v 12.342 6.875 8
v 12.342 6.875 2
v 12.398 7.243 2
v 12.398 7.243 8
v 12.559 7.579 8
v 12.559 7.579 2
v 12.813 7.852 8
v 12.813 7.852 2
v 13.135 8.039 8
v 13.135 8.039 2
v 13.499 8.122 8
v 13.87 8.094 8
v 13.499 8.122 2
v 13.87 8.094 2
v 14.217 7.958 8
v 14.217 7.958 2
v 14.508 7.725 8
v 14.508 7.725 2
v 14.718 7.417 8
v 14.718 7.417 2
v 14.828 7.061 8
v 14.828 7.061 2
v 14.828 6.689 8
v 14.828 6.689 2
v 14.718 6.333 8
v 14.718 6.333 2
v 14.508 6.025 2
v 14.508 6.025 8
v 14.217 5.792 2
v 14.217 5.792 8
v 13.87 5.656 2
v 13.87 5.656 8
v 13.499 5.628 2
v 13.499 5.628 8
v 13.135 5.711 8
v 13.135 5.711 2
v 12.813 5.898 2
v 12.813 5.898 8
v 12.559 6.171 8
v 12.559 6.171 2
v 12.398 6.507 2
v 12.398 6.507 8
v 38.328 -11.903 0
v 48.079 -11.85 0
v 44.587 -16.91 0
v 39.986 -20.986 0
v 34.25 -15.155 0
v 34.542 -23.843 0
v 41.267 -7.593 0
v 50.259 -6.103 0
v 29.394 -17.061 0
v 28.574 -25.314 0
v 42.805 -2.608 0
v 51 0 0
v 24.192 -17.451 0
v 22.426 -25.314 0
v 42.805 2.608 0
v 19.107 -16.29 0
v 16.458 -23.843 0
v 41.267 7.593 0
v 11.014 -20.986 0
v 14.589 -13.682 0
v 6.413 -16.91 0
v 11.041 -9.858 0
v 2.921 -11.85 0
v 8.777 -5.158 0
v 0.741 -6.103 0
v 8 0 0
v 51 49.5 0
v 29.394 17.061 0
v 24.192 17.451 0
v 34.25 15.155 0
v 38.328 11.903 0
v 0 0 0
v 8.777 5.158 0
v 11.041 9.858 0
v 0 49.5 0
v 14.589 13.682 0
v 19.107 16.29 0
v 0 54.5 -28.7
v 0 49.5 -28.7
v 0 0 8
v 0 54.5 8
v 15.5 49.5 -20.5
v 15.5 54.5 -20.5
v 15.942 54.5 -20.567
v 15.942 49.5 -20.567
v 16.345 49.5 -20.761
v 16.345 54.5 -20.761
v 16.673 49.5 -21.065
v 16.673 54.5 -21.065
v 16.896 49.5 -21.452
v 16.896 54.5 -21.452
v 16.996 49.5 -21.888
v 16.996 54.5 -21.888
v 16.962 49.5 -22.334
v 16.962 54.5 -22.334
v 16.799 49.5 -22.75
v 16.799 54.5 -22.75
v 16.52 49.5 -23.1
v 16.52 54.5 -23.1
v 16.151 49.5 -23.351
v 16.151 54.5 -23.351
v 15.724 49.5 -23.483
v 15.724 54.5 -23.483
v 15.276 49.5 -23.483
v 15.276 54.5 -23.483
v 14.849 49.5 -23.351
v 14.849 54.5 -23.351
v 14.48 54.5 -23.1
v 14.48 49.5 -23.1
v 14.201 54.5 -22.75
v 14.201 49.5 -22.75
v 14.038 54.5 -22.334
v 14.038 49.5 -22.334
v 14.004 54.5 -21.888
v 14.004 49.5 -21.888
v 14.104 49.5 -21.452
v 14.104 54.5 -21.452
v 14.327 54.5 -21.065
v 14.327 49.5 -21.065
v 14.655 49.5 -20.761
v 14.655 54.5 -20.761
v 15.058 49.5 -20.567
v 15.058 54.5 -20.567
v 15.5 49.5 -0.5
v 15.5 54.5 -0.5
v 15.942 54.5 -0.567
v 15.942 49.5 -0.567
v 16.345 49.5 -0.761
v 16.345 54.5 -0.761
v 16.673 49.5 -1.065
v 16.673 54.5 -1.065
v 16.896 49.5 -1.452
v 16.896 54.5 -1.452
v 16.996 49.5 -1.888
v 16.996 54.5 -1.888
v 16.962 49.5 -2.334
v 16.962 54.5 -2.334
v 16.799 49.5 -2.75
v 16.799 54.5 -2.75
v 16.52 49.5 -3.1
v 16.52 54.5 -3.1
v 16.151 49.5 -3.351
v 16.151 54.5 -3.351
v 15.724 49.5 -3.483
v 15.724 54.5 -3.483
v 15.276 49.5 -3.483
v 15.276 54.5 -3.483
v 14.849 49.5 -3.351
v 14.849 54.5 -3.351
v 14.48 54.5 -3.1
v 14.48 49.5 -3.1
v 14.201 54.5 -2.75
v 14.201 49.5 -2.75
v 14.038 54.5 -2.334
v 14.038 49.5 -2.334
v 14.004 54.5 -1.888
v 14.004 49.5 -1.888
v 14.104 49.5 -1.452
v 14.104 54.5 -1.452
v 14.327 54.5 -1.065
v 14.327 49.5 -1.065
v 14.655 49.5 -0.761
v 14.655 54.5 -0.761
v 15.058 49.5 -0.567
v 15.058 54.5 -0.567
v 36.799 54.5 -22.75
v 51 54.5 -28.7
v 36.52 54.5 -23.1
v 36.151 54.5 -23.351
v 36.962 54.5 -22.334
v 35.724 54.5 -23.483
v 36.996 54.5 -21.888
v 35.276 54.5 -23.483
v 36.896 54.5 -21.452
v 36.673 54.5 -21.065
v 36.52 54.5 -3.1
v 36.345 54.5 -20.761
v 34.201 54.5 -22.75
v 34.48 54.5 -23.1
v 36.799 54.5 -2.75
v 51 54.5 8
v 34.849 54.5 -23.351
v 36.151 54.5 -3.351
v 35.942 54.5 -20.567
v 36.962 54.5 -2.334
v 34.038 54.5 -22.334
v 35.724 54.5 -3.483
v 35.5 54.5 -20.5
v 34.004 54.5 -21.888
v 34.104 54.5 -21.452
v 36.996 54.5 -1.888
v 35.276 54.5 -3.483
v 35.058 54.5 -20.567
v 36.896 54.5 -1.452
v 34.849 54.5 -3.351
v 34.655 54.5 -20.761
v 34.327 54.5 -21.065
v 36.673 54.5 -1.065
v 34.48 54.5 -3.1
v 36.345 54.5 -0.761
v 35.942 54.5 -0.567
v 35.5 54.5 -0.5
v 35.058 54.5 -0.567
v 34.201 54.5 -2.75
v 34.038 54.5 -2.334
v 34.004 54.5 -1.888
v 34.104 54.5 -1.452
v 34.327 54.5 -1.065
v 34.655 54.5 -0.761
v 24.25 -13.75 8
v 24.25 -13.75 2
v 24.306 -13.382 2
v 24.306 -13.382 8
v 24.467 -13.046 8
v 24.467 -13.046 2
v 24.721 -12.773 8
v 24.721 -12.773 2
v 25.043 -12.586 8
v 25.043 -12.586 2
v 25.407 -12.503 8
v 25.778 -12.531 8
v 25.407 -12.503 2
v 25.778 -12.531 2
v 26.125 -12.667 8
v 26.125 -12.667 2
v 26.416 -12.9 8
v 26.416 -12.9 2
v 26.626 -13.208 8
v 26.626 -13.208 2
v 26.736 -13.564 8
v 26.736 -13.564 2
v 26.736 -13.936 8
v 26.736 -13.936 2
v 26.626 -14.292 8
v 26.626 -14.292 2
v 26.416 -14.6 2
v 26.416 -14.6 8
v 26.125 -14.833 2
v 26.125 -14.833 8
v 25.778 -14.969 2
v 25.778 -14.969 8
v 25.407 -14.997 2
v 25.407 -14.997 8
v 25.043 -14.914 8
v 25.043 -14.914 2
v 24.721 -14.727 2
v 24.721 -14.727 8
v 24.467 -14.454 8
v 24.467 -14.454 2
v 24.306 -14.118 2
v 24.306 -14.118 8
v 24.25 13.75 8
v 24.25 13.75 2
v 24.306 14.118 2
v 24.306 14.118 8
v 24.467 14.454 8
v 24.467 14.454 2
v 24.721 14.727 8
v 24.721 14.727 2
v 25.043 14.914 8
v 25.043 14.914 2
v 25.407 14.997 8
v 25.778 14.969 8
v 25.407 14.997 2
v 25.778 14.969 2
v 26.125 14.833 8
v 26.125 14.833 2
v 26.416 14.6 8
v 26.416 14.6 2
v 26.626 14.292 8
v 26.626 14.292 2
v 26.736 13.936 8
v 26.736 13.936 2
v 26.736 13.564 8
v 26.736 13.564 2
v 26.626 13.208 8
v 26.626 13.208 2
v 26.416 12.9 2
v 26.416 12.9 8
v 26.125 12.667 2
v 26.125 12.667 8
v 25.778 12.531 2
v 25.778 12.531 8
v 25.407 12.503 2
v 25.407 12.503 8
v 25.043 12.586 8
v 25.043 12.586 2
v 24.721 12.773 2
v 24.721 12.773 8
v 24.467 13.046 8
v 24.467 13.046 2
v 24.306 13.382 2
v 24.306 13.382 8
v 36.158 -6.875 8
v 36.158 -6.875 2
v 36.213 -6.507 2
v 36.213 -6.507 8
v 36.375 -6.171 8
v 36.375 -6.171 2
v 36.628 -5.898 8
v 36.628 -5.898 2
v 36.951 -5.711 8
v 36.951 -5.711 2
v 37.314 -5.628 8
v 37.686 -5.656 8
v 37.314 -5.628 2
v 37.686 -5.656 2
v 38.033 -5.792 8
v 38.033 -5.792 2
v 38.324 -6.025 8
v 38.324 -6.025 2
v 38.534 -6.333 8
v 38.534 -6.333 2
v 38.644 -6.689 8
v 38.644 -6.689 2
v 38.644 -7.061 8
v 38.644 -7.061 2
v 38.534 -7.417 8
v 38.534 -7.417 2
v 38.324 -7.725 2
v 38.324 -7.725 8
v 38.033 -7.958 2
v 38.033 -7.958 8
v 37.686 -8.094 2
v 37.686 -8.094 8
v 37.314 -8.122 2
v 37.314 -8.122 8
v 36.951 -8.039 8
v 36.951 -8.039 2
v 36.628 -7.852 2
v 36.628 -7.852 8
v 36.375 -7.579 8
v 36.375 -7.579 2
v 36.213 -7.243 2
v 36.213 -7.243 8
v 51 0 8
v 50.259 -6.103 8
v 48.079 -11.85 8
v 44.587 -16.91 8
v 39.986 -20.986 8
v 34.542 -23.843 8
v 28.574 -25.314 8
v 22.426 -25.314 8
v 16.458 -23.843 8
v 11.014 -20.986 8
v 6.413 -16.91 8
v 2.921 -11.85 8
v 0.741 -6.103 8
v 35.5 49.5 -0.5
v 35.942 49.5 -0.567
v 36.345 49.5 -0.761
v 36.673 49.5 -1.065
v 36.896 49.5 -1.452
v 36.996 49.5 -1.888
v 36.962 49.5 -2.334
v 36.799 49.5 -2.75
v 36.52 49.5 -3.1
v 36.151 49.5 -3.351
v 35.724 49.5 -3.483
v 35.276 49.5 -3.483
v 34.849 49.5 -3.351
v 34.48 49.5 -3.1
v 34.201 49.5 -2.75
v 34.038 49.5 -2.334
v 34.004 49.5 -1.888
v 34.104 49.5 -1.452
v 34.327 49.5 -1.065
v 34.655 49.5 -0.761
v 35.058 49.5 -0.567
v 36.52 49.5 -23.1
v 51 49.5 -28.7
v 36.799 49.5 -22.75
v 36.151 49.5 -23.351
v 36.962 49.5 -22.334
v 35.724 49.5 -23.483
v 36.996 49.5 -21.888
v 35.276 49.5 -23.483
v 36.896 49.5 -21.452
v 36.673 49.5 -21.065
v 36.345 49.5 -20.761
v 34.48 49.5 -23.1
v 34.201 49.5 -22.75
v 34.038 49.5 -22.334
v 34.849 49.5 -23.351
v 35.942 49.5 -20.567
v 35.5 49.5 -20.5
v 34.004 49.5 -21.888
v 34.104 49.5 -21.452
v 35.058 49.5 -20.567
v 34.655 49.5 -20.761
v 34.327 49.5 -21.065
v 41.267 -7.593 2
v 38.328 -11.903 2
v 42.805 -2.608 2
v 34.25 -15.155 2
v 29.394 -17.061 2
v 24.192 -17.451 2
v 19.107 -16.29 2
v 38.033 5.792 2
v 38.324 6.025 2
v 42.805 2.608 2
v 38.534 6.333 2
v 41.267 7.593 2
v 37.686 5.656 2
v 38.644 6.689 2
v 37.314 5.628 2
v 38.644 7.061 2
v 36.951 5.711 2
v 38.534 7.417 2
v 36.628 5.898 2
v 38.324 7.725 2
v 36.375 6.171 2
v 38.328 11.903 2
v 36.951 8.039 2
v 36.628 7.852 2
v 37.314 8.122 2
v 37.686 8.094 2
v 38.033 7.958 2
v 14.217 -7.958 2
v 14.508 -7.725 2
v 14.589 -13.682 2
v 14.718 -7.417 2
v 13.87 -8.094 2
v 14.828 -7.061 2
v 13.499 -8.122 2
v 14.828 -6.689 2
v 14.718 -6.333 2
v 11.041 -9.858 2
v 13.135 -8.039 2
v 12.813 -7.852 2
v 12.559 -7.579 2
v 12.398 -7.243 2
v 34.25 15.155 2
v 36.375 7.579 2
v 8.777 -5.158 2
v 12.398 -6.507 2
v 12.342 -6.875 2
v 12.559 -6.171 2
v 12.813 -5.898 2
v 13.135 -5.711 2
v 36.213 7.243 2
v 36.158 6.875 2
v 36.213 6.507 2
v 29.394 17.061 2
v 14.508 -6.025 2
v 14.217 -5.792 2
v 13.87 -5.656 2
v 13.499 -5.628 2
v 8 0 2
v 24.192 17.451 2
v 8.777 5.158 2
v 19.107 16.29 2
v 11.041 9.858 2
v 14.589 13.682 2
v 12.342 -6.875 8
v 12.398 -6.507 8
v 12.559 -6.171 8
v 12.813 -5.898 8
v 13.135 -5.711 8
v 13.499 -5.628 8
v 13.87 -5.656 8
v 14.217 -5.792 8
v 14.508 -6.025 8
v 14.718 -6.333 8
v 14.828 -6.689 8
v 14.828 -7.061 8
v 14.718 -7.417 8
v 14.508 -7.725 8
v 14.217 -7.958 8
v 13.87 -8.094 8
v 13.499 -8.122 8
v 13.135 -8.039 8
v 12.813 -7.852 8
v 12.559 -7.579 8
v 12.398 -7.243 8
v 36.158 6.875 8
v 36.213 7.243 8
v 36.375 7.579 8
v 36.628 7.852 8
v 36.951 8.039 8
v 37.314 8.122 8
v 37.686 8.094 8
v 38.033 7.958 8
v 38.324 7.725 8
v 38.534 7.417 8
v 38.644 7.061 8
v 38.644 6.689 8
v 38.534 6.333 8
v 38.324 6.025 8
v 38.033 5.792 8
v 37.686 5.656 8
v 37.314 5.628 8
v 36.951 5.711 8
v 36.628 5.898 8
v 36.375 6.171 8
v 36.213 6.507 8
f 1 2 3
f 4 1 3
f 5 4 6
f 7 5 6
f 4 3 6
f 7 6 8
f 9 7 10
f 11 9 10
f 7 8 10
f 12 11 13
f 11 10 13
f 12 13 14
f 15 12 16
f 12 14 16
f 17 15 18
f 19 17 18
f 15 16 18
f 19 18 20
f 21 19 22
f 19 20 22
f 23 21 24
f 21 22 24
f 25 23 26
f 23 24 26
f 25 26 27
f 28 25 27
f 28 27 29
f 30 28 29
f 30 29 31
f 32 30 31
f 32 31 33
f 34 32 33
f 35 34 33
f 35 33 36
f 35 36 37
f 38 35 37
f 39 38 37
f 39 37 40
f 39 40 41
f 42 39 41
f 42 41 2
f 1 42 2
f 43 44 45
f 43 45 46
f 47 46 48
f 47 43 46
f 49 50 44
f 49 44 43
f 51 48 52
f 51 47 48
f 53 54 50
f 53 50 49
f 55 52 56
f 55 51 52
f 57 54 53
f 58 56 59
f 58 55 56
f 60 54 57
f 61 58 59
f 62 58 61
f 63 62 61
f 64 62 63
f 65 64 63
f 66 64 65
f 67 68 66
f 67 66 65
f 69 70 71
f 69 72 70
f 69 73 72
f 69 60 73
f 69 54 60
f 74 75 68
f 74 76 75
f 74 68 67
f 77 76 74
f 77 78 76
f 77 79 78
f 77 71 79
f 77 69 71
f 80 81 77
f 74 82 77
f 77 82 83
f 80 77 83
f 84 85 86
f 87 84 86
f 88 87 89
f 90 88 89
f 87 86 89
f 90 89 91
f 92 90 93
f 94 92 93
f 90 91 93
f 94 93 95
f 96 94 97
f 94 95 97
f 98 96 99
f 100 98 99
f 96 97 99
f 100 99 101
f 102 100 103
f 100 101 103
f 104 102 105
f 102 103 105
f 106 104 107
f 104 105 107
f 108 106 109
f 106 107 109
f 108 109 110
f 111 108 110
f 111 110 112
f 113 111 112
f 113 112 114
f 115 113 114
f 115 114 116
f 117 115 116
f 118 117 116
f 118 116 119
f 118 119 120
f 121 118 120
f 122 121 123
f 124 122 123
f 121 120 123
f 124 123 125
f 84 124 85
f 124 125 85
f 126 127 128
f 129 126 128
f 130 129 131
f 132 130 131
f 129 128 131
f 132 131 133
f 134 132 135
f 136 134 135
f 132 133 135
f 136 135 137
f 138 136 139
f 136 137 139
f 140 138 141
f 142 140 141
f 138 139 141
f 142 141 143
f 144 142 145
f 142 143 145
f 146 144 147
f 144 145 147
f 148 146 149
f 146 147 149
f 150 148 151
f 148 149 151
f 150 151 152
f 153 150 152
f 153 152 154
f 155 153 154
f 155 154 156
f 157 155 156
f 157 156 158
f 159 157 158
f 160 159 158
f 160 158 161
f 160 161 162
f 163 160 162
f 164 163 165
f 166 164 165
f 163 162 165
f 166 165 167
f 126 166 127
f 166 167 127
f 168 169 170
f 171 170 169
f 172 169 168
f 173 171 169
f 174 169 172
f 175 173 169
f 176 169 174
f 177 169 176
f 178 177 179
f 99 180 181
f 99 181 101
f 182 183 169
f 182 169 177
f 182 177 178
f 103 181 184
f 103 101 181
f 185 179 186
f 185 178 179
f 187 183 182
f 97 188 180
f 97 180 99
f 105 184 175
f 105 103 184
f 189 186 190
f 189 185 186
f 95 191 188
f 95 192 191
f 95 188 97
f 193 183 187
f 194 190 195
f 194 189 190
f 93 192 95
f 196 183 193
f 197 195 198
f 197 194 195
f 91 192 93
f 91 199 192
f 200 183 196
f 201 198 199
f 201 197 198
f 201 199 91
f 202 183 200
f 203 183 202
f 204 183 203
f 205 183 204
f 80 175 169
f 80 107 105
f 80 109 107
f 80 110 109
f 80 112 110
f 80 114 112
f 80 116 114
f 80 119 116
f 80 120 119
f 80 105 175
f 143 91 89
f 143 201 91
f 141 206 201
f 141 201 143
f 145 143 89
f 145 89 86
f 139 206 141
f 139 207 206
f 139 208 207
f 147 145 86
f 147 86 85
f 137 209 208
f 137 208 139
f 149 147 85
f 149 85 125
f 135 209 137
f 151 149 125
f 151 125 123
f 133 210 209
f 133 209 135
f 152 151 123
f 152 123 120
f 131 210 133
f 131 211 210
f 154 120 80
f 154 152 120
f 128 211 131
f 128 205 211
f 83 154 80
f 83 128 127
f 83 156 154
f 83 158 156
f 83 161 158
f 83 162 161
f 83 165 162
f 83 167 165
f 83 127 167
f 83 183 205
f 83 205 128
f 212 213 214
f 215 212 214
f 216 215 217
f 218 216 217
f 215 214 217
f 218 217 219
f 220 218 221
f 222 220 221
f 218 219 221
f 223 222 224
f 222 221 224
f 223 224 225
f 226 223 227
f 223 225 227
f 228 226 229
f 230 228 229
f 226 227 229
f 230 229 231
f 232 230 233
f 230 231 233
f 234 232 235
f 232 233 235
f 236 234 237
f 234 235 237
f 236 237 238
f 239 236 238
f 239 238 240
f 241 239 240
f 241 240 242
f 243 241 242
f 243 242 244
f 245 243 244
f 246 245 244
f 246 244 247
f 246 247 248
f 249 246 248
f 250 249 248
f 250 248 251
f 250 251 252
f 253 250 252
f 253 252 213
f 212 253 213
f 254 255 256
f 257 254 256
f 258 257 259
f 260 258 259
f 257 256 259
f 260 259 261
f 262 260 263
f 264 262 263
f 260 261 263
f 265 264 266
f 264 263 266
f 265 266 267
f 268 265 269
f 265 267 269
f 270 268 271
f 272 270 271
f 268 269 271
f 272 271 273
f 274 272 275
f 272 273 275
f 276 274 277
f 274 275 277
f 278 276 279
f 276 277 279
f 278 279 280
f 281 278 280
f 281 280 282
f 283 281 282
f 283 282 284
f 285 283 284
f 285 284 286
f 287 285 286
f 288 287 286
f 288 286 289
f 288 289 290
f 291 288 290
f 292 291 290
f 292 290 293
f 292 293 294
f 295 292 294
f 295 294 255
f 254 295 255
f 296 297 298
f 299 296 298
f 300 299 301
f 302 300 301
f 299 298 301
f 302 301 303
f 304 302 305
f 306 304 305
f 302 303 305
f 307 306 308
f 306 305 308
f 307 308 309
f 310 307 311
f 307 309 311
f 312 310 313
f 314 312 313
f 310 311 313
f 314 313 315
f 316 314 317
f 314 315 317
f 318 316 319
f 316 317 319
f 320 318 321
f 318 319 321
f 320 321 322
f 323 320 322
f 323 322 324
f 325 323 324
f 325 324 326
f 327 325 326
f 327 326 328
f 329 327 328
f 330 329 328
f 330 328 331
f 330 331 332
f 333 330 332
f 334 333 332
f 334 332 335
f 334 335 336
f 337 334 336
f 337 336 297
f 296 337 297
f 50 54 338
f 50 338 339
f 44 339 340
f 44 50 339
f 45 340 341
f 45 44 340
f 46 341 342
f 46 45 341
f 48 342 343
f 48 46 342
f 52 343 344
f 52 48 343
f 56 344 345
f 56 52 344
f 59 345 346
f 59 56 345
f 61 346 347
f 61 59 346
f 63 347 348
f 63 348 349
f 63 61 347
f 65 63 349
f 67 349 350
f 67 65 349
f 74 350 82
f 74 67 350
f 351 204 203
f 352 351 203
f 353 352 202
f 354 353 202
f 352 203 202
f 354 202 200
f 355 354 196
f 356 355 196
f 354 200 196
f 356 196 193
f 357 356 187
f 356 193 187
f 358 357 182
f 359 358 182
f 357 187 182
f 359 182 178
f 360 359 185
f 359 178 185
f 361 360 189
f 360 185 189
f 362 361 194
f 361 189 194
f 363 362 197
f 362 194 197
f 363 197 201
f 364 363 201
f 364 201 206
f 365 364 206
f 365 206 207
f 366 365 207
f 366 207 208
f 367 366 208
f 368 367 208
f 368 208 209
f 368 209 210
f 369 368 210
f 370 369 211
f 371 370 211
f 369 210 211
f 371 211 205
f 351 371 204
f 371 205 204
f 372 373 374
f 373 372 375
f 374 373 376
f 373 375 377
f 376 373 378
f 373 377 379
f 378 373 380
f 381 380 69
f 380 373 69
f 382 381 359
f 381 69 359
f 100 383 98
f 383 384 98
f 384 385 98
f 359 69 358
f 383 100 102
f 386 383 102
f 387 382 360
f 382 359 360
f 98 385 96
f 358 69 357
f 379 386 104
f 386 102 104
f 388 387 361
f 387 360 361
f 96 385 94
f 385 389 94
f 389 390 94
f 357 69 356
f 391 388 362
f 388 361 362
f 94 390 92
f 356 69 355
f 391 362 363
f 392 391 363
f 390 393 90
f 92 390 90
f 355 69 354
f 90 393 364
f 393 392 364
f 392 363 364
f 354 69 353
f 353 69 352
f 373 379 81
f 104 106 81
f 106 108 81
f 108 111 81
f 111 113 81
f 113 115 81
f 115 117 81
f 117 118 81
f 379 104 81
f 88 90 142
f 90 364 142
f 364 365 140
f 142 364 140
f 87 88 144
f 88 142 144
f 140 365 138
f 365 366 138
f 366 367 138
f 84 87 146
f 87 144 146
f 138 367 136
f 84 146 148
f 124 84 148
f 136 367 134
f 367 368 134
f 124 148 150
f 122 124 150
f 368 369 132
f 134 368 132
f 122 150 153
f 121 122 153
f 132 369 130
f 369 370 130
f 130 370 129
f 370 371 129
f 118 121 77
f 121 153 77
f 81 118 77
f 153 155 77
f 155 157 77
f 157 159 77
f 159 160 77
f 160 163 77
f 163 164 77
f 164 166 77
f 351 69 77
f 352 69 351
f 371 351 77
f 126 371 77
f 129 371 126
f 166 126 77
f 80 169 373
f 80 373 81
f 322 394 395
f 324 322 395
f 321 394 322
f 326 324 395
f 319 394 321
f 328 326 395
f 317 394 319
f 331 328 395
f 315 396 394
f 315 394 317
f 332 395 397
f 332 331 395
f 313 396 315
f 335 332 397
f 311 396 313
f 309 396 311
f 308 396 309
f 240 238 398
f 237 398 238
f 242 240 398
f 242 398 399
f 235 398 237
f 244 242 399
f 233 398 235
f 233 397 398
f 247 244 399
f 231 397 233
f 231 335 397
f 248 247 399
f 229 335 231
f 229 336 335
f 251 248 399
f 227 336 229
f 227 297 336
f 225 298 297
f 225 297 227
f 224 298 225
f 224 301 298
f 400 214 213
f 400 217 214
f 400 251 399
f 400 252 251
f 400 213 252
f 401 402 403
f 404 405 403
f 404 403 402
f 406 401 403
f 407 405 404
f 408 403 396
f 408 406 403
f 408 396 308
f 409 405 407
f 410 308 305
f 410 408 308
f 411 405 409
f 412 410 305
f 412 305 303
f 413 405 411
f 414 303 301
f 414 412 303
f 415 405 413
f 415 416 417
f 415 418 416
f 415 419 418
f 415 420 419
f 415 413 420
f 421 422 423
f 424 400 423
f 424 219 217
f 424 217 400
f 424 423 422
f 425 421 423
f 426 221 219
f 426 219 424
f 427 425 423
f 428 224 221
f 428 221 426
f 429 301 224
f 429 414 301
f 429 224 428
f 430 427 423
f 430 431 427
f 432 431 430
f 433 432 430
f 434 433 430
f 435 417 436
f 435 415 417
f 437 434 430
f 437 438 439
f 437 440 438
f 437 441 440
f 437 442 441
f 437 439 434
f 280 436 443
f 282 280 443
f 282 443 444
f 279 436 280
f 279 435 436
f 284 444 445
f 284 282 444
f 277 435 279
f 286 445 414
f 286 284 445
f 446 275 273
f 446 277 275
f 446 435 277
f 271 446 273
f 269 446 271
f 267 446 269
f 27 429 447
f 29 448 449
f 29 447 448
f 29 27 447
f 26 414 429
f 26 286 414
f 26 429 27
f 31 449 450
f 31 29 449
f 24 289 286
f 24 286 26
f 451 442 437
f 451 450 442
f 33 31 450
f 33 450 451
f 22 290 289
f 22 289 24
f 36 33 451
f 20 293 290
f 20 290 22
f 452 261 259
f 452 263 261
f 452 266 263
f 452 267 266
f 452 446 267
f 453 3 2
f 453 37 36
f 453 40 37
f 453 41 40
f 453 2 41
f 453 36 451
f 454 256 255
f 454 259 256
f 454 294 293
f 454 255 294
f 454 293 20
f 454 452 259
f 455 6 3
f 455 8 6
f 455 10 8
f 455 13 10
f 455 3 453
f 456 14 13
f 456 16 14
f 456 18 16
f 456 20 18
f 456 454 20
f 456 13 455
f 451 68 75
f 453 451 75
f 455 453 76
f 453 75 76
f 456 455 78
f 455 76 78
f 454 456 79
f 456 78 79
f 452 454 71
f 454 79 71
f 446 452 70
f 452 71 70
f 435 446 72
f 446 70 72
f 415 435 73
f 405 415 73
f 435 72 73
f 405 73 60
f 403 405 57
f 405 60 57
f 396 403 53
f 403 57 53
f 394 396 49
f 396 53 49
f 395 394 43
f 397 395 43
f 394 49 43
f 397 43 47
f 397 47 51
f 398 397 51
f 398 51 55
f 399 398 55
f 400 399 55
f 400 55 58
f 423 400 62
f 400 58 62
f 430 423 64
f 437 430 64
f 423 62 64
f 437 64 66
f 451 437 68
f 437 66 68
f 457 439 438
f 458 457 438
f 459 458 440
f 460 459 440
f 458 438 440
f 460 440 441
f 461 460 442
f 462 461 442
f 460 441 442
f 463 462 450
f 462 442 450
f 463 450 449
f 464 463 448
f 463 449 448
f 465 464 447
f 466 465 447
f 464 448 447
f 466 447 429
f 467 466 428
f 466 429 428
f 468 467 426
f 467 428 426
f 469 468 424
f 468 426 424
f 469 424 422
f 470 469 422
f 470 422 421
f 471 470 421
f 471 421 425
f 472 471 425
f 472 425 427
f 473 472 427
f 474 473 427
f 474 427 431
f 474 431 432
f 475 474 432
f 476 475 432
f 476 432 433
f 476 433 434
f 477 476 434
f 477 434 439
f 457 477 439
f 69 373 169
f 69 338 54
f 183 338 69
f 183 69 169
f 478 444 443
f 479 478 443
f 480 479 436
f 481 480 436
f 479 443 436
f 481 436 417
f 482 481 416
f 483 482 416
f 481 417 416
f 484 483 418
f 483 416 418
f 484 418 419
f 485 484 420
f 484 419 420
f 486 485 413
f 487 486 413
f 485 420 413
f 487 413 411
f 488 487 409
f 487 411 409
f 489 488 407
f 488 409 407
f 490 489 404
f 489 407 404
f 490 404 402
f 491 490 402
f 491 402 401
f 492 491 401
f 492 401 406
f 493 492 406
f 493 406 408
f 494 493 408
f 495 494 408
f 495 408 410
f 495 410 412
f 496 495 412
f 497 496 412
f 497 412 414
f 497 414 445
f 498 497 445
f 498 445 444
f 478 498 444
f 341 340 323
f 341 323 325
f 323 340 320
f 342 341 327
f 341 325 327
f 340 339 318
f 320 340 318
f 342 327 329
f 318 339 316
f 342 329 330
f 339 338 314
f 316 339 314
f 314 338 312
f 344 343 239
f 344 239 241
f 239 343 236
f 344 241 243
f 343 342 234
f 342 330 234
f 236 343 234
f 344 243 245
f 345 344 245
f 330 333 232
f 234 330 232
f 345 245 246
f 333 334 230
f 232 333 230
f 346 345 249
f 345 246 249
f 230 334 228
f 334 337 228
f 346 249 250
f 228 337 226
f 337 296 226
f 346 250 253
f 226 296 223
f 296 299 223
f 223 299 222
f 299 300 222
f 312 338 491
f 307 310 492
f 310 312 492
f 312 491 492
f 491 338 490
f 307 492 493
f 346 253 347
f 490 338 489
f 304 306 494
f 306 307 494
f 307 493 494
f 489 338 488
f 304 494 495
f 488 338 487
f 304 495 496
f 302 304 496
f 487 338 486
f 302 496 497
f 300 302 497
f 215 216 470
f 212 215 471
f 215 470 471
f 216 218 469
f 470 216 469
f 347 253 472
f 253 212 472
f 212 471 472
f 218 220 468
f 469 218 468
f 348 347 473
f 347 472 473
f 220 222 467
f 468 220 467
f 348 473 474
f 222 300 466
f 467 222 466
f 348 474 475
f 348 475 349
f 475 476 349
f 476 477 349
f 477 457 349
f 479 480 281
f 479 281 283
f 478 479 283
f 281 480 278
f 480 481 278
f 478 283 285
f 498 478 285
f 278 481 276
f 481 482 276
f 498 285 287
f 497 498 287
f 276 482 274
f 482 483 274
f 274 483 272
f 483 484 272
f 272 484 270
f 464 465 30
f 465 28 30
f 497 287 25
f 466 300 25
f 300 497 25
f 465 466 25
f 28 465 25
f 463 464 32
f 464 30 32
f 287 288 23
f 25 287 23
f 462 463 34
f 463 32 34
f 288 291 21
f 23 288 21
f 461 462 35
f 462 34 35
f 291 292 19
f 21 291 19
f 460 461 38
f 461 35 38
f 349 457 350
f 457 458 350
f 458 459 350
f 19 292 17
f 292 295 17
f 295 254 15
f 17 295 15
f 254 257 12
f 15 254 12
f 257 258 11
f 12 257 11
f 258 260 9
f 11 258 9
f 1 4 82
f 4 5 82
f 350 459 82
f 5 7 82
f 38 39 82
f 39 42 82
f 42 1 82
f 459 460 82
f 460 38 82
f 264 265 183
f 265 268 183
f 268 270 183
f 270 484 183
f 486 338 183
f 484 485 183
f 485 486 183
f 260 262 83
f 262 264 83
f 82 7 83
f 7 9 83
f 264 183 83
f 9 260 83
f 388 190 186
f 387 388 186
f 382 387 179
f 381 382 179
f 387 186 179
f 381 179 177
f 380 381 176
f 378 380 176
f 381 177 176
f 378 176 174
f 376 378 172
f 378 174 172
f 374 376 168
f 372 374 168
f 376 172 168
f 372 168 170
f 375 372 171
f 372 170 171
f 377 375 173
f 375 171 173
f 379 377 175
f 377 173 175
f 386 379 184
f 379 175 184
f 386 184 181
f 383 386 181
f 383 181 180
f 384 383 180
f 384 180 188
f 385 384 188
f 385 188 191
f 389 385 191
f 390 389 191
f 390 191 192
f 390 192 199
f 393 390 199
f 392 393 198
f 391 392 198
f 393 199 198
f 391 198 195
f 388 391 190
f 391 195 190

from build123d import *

# Parameters (mm, degrees)
EXTRUDE_1_DEPTH     = 8
SKETCH_2_W          = 51
SKETCH_2_H          = 5
EXTRUDE_2_DEPTH     = 28.7
SKETCH_3_R          = 17.5
CUT_EXTRUDE_1_DEPTH = 2
CUT_EXTRUDE_2_REACH = 82.708
SKETCH_4_R          = 1.25
SKETCH_5_R          = 1.5
CUT_EXTRUDE_3_DEPTH = 5


with BuildPart() as part:
    # 스케치1 → 보스-돌출1 (new body)
    with BuildSketch(Plane.XY):
        with BuildLine():
            Line((0, 0), (0, 54.5))
            Line((0, 54.5), (51, 54.5))
            Line((51, 54.5), (51, 0))
            ThreePointArc((51, 0), (25.5, -25.5), (0, 0))
        make_face()
    extrude(amount=EXTRUDE_1_DEPTH)

    # 스케치2 → 보스-돌출2 (add)
    with BuildSketch(Plane(origin=(0, 0, 0), x_dir=(-1, 0, 0), z_dir=(0, 0, -1))):
        with Locations((-25.5, 52)):
            Rectangle(SKETCH_2_W, SKETCH_2_H)
    extrude(amount=EXTRUDE_2_DEPTH)

    # 스케치3 → 컷-돌출1 (cut)
    with BuildSketch(Plane(origin=(0, 0, 0), x_dir=(-1, 0, 0), z_dir=(0, 0, -1))):
        with Locations((-25.5, 0)):
            Circle(SKETCH_3_R)
    extrude(amount=-CUT_EXTRUDE_1_DEPTH, mode=Mode.SUBTRACT)

    # 스케치4 → 컷-돌출2 (cut, up to next)
    with BuildSketch(Plane(origin=(0, 0, 2), x_dir=(-1, 0, 0), z_dir=(0, 0, -1)), mode=Mode.PRIVATE) as cut_extrude_2_sk1:
        with Locations((-25.5, 13.75)):
            Circle(SKETCH_4_R)
    cut_extrude_2_tool1 = extrude(cut_extrude_2_sk1.sketch, amount=-CUT_EXTRUDE_2_REACH, mode=Mode.PRIVATE) & part.part
    # 스케치4 → 컷-돌출2 (cut, up to next)
    with BuildSketch(Plane(origin=(0, 0, 2), x_dir=(-1, 0, 0), z_dir=(0, 0, -1)), mode=Mode.PRIVATE) as cut_extrude_2_sk2:
        with Locations((-13.592150698, 6.875)):
            Circle(SKETCH_4_R)
    cut_extrude_2_tool2 = extrude(cut_extrude_2_sk2.sketch, amount=-CUT_EXTRUDE_2_REACH, mode=Mode.PRIVATE) & part.part
    # 스케치4 → 컷-돌출2 (cut, up to next)
    with BuildSketch(Plane(origin=(0, 0, 2), x_dir=(-1, 0, 0), z_dir=(0, 0, -1)), mode=Mode.PRIVATE) as cut_extrude_2_sk3:
        with Locations((-13.592150698, -6.875)):
            Circle(SKETCH_4_R)
    cut_extrude_2_tool3 = extrude(cut_extrude_2_sk3.sketch, amount=-CUT_EXTRUDE_2_REACH, mode=Mode.PRIVATE) & part.part
    # 스케치4 → 컷-돌출2 (cut, up to next)
    with BuildSketch(Plane(origin=(0, 0, 2), x_dir=(-1, 0, 0), z_dir=(0, 0, -1)), mode=Mode.PRIVATE) as cut_extrude_2_sk4:
        with Locations((-25.5, -13.75)):
            Circle(SKETCH_4_R)
    cut_extrude_2_tool4 = extrude(cut_extrude_2_sk4.sketch, amount=-CUT_EXTRUDE_2_REACH, mode=Mode.PRIVATE) & part.part
    # 스케치4 → 컷-돌출2 (cut, up to next)
    with BuildSketch(Plane(origin=(0, 0, 2), x_dir=(-1, 0, 0), z_dir=(0, 0, -1)), mode=Mode.PRIVATE) as cut_extrude_2_sk5:
        with Locations((-37.407849302, -6.875)):
            Circle(SKETCH_4_R)
    cut_extrude_2_tool5 = extrude(cut_extrude_2_sk5.sketch, amount=-CUT_EXTRUDE_2_REACH, mode=Mode.PRIVATE) & part.part
    # 스케치4 → 컷-돌출2 (cut, up to next)
    with BuildSketch(Plane(origin=(0, 0, 2), x_dir=(-1, 0, 0), z_dir=(0, 0, -1)), mode=Mode.PRIVATE) as cut_extrude_2_sk6:
        with Locations((-37.407849302, 6.875)):
            Circle(SKETCH_4_R)
    cut_extrude_2_tool6 = extrude(cut_extrude_2_sk6.sketch, amount=-CUT_EXTRUDE_2_REACH, mode=Mode.PRIVATE) & part.part
    add(cut_extrude_2_tool1.solids().sort_by_distance((25.5, 13.75, 2))[0], mode=Mode.SUBTRACT)
    add(cut_extrude_2_tool2.solids().sort_by_distance((13.592151, 6.875, 2))[0], mode=Mode.SUBTRACT)
    add(cut_extrude_2_tool3.solids().sort_by_distance((13.592151, -6.875, 2))[0], mode=Mode.SUBTRACT)
    add(cut_extrude_2_tool4.solids().sort_by_distance((25.5, -13.75, 2))[0], mode=Mode.SUBTRACT)
    add(cut_extrude_2_tool5.solids().sort_by_distance((37.407849, -6.875, 2))[0], mode=Mode.SUBTRACT)
    add(cut_extrude_2_tool6.solids().sort_by_distance((37.407849, 6.875, 2))[0], mode=Mode.SUBTRACT)

    # 스케치5 → 컷-돌출3 (cut)
    with BuildSketch(Plane(origin=(0, 54.5, 0), x_dir=(1, 0, 0), z_dir=(0, 1, 0))):
        with Locations(Location((15.5, 22, 0), (0, 0, 270))):
            Circle(SKETCH_5_R)
        with Locations(Location((35.5, 22, 0), (0, 0, 270))):
            Circle(SKETCH_5_R)
        with Locations(Location((35.5, 2, 0), (0, 0, 270))):
            Circle(SKETCH_5_R)
        with Locations(Location((15.5, 2, 0), (0, 0, 270))):
            Circle(SKETCH_5_R)
    extrude(amount=-CUT_EXTRUDE_3_DEPTH, mode=Mode.SUBTRACT)


solid = part.part
